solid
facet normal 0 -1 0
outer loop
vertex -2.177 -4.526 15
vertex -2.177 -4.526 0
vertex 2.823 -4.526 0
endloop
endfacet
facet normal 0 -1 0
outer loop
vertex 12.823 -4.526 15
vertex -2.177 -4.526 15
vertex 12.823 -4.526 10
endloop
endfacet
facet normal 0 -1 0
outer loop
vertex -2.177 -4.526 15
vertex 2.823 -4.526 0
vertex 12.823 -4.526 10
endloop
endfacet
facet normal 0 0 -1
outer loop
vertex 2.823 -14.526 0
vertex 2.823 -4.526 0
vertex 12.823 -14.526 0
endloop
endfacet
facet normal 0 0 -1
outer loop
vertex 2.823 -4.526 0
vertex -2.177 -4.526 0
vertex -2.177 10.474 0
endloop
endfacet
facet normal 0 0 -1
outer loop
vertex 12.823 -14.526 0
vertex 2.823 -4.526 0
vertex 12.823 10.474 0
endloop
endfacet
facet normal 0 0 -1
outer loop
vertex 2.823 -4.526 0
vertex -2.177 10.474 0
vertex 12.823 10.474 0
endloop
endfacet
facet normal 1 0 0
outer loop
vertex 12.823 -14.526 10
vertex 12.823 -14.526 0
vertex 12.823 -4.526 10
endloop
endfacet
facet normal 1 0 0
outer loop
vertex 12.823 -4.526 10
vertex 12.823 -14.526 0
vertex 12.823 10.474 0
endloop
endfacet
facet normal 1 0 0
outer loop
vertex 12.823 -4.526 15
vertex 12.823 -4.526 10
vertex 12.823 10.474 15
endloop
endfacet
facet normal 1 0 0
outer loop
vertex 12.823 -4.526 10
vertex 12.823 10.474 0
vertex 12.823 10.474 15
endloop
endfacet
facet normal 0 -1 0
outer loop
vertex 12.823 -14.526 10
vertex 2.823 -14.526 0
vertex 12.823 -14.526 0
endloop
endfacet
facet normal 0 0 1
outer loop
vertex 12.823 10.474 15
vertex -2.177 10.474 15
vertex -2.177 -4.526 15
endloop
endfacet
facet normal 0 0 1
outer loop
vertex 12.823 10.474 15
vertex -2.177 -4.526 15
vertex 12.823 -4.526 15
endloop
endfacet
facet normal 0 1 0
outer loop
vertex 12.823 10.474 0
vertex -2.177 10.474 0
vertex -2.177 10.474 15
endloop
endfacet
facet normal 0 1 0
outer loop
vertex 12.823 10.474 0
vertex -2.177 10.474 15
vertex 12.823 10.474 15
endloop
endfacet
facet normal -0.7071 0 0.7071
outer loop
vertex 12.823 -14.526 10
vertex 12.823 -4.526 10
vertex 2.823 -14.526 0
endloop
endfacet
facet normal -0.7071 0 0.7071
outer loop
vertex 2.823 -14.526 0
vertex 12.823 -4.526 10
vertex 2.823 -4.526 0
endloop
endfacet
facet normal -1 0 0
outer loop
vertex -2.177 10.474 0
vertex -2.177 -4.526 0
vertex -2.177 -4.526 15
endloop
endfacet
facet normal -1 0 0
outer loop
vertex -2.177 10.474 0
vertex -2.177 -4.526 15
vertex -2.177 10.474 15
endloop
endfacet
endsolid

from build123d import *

# Parameters (mm, degrees)
F0_W     = 15
F0_H     = 15
F1_DEPTH = 15
F3_DEPTH = 10


with BuildPart() as f1:
    # F0 (on Top) → F1 (new body)
    with BuildSketch(Plane.XY):
        with Locations((5.322702, 2.974191)):
            Rectangle(F0_W, F0_H)
    extrude(amount=F1_DEPTH)

    # F2 (on face) → F3 (join)
    with BuildSketch(Plane.XZ.offset(4.525809)):
        Polygon((12.822702, 0), (12.822702, 10), (2.822702, 0), align=None)
    extrude(amount=F3_DEPTH)


solid = f1.part
